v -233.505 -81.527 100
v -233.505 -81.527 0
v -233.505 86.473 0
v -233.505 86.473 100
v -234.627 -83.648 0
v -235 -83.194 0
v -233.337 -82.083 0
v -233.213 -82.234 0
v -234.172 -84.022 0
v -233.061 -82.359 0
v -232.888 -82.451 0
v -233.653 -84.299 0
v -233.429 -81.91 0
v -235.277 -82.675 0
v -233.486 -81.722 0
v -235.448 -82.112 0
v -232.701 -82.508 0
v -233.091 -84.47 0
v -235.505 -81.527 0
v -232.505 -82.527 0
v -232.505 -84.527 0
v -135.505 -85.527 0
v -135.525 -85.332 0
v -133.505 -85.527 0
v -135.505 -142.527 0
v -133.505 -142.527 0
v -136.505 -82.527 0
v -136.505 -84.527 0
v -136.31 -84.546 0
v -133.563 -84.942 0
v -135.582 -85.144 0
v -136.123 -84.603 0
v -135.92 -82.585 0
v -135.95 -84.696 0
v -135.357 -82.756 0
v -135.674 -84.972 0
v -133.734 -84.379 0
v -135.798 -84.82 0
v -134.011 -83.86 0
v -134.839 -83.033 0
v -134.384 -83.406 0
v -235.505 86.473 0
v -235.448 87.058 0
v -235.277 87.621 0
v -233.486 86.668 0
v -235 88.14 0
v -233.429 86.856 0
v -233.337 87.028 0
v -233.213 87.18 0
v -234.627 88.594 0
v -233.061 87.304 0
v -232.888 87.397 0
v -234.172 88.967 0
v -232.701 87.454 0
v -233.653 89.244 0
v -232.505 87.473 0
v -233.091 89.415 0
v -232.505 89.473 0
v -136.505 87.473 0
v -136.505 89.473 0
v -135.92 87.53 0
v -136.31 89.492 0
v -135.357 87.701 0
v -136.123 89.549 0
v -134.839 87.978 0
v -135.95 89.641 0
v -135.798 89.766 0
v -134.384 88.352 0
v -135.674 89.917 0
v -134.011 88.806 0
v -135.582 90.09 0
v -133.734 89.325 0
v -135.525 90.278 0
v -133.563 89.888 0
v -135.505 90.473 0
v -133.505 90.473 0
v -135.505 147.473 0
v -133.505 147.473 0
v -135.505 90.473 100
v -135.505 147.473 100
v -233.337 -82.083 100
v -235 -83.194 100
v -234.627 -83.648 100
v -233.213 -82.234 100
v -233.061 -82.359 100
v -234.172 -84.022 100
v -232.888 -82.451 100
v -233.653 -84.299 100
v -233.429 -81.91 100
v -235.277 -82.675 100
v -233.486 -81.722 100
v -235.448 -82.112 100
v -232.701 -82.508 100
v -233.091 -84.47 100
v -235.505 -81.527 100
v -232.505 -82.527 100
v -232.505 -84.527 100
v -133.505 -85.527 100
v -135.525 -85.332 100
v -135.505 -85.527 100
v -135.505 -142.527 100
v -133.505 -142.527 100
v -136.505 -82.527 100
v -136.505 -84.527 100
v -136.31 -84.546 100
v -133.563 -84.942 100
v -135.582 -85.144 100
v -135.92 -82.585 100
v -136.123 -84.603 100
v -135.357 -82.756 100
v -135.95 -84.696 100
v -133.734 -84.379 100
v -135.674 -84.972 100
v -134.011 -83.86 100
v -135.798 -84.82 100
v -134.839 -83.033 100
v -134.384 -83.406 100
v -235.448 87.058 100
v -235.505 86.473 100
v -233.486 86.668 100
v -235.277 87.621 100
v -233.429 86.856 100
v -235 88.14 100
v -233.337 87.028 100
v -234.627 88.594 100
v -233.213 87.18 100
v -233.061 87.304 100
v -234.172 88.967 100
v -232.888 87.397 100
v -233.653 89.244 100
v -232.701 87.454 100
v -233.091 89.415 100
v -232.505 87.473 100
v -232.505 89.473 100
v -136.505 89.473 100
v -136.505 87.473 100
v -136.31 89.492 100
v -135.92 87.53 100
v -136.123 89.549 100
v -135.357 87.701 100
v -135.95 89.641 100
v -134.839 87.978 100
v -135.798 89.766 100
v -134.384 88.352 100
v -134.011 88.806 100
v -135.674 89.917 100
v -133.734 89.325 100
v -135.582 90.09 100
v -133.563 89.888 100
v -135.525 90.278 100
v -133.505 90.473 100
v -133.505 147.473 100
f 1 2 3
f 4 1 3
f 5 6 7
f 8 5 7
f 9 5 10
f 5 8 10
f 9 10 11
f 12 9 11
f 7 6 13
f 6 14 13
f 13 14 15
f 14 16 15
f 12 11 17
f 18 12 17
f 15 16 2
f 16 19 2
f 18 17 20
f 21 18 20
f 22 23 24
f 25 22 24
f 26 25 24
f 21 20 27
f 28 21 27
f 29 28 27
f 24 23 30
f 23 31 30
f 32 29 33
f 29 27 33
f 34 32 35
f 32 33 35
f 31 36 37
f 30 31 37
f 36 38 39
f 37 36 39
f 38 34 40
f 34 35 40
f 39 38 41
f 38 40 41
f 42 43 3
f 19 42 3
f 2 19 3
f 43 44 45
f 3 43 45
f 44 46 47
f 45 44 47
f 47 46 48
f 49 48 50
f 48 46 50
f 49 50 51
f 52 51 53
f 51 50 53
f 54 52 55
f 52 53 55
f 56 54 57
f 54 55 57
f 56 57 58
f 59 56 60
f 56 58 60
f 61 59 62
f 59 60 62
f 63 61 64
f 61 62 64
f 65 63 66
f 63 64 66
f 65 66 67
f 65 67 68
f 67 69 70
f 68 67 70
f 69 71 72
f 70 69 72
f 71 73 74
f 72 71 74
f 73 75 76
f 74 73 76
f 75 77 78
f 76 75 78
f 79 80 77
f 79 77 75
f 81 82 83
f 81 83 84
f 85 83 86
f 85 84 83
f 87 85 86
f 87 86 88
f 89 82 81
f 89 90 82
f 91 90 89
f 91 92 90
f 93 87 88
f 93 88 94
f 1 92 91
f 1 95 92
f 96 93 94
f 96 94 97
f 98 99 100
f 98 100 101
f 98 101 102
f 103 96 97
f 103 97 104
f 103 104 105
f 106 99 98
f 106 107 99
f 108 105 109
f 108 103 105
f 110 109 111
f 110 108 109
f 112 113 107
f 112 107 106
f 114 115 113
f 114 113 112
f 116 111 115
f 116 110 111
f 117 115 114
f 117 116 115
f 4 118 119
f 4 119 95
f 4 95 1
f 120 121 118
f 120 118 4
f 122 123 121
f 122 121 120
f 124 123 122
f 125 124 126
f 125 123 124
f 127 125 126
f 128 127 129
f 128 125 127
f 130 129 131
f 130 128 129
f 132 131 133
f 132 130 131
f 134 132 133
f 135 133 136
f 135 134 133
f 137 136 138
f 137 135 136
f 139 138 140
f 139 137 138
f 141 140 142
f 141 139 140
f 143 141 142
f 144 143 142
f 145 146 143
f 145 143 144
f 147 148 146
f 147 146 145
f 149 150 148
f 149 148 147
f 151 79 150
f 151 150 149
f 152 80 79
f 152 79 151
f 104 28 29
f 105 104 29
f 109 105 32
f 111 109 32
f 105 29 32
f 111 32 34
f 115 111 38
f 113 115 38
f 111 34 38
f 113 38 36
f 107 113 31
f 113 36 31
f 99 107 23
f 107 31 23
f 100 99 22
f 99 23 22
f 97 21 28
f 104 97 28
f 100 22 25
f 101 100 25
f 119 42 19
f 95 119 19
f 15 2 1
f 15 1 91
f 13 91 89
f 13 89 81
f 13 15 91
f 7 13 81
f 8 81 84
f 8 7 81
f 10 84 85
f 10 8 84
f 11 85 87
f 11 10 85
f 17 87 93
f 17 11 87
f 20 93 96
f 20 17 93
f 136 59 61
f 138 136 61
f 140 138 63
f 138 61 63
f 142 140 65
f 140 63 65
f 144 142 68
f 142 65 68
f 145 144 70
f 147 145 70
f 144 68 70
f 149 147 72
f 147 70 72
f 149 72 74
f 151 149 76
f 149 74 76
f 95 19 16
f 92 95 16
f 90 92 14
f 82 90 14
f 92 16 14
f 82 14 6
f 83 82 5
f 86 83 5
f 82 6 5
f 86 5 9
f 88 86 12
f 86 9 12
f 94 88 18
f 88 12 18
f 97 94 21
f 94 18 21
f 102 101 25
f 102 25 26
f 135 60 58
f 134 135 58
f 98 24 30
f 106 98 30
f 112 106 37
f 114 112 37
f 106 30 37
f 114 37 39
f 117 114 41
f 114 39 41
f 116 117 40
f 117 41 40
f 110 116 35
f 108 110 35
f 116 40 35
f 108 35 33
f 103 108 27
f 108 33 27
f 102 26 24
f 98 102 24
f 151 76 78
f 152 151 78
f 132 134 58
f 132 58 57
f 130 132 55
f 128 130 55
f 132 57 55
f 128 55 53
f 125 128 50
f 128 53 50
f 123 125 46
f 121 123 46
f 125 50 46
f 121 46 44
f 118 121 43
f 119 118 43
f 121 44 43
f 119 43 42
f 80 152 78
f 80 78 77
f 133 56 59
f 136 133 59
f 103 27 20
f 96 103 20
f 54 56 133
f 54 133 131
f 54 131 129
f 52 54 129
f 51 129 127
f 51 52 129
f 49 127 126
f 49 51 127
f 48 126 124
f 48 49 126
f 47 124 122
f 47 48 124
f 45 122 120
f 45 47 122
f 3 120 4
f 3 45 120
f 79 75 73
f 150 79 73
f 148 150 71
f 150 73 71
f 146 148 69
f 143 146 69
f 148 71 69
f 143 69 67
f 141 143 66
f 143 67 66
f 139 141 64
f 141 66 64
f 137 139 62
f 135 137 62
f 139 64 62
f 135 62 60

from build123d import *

# Parameters (mm, degrees)
EXTRU_MINCE1_DEPTH        = 100
CONVERTIR_VOLUME1_DEPTH   = 100
CONVERTIR_VOLUME1_2_DEPTH = 100


# Read off the part's stored shape, not the designer's step: Convertir-Volume1
with BuildPart() as part:
    # Esquisse1 → Extru.-Mince1 (new body)
    with BuildSketch(Plane.XY):
        Polygon((-133.505441468, 147.472825463), (-133.505441468, 87.472825463), (-233.505441468, 87.472825463), (-233.505441468, -82.527174537), (-133.505441468, -82.527174537), (-133.505441468, -142.527174537), (-123.505441468, -142.527174537), (-123.505441468, -72.527174537), (-223.505441468, -72.527174537), (-223.505441468, 77.472825463), (-123.505441468, 77.472825463), (-123.505441468, 147.472825463), align=None)
    extrude(amount=EXTRU_MINCE1_DEPTH)

    # Convertir-Volume1 outline → Convertir-Volume1 (cut)
    with BuildSketch(Plane.XY):
        with BuildLine():
            Line((-123.505441468, 147.472825463), (-133.505441468, 147.472825463))
            Line((-133.505441468, 147.472825463), (-133.505441468, 87.472825463))
            Line((-133.505441468, 87.472825463), (-232.505441468, 87.472825463))
            ThreePointArc((-232.505441468, 87.472825463), (-233.212548249, 87.179932244), (-233.505441468, 86.472825463))
            Line((-233.505441468, 86.472825463), (-233.505441468, -81.527174537))
            ThreePointArc((-233.505441468, -81.527174537), (-233.212548249, -82.234281318), (-232.505441468, -82.527174537))
            Line((-232.505441468, -82.527174537), (-133.505441468, -82.527174537))
            Line((-133.505441468, -82.527174537), (-133.505441468, -142.527174537))
            Line((-133.505441468, -142.527174537), (-123.505441468, -142.527174537))
            Line((-123.505441468, -142.527174537), (-123.505441468, -72.527174537))
            Line((-123.505441468, -72.527174537), (-223.505441468, -72.527174537))
            Line((-223.505441468, -72.527174537), (-223.505441468, 77.472825463))
            Line((-223.505441468, 77.472825463), (-123.505441468, 77.472825463))
            Line((-123.505441468, 77.472825463), (-123.505441468, 147.472825463))
        make_face()
    extrude(amount=CONVERTIR_VOLUME1_DEPTH, mode=Mode.SUBTRACT)

    # Convertir-Volume1 2 outline → Convertir-Volume1 2 (add)
    with BuildSketch(Plane.XY):
        with BuildLine():
            Line((-133.505441468, 147.472825463), (-135.505441468, 147.472825463))
            Line((-135.505441468, 147.472825463), (-135.505441468, 90.472825463))
            ThreePointArc((-135.505441468, 90.472825463), (-135.798334686, 89.765718682), (-136.505441468, 89.472825463))
            Line((-136.505441468, 89.472825463), (-232.505441468, 89.472825463))
            ThreePointArc((-232.505441468, 89.472825463), (-234.626761811, 88.594145807), (-235.505441468, 86.472825463))
            Line((-235.505441468, 86.472825463), (-235.505441468, -81.527174537))
            ThreePointArc((-235.505441468, -81.527174537), (-234.626761811, -83.64849488), (-232.505441468, -84.527174537))
            Line((-232.505441468, -84.527174537), (-136.505441468, -84.527174537))
            ThreePointArc((-136.505441468, -84.527174537), (-135.798334686, -84.820067756), (-135.505441468, -85.527174537))
            Line((-135.505441468, -85.527174537), (-135.505441468, -142.527174537))
            Line((-135.505441468, -142.527174537), (-133.505441468, -142.527174537))
            Line((-133.505441468, -142.527174537), (-133.505441468, -85.527174537))
            ThreePointArc((-133.505441468, -85.527174537), (-134.384121124, -83.405854193), (-136.505441468, -82.527174537))
            Line((-136.505441468, -82.527174537), (-233.505441468, -82.527174537))
            Line((-233.505441468, -82.527174537), (-233.505441468, 87.472825463))
            Line((-233.505441468, 87.472825463), (-136.505441468, 87.472825463))
            ThreePointArc((-136.505441468, 87.472825463), (-134.384121124, 88.351505119), (-133.505441468, 90.472825463))
            Line((-133.505441468, 90.472825463), (-133.505441468, 147.472825463))
        make_face()
    extrude(amount=CONVERTIR_VOLUME1_2_DEPTH)


solid = part.part
